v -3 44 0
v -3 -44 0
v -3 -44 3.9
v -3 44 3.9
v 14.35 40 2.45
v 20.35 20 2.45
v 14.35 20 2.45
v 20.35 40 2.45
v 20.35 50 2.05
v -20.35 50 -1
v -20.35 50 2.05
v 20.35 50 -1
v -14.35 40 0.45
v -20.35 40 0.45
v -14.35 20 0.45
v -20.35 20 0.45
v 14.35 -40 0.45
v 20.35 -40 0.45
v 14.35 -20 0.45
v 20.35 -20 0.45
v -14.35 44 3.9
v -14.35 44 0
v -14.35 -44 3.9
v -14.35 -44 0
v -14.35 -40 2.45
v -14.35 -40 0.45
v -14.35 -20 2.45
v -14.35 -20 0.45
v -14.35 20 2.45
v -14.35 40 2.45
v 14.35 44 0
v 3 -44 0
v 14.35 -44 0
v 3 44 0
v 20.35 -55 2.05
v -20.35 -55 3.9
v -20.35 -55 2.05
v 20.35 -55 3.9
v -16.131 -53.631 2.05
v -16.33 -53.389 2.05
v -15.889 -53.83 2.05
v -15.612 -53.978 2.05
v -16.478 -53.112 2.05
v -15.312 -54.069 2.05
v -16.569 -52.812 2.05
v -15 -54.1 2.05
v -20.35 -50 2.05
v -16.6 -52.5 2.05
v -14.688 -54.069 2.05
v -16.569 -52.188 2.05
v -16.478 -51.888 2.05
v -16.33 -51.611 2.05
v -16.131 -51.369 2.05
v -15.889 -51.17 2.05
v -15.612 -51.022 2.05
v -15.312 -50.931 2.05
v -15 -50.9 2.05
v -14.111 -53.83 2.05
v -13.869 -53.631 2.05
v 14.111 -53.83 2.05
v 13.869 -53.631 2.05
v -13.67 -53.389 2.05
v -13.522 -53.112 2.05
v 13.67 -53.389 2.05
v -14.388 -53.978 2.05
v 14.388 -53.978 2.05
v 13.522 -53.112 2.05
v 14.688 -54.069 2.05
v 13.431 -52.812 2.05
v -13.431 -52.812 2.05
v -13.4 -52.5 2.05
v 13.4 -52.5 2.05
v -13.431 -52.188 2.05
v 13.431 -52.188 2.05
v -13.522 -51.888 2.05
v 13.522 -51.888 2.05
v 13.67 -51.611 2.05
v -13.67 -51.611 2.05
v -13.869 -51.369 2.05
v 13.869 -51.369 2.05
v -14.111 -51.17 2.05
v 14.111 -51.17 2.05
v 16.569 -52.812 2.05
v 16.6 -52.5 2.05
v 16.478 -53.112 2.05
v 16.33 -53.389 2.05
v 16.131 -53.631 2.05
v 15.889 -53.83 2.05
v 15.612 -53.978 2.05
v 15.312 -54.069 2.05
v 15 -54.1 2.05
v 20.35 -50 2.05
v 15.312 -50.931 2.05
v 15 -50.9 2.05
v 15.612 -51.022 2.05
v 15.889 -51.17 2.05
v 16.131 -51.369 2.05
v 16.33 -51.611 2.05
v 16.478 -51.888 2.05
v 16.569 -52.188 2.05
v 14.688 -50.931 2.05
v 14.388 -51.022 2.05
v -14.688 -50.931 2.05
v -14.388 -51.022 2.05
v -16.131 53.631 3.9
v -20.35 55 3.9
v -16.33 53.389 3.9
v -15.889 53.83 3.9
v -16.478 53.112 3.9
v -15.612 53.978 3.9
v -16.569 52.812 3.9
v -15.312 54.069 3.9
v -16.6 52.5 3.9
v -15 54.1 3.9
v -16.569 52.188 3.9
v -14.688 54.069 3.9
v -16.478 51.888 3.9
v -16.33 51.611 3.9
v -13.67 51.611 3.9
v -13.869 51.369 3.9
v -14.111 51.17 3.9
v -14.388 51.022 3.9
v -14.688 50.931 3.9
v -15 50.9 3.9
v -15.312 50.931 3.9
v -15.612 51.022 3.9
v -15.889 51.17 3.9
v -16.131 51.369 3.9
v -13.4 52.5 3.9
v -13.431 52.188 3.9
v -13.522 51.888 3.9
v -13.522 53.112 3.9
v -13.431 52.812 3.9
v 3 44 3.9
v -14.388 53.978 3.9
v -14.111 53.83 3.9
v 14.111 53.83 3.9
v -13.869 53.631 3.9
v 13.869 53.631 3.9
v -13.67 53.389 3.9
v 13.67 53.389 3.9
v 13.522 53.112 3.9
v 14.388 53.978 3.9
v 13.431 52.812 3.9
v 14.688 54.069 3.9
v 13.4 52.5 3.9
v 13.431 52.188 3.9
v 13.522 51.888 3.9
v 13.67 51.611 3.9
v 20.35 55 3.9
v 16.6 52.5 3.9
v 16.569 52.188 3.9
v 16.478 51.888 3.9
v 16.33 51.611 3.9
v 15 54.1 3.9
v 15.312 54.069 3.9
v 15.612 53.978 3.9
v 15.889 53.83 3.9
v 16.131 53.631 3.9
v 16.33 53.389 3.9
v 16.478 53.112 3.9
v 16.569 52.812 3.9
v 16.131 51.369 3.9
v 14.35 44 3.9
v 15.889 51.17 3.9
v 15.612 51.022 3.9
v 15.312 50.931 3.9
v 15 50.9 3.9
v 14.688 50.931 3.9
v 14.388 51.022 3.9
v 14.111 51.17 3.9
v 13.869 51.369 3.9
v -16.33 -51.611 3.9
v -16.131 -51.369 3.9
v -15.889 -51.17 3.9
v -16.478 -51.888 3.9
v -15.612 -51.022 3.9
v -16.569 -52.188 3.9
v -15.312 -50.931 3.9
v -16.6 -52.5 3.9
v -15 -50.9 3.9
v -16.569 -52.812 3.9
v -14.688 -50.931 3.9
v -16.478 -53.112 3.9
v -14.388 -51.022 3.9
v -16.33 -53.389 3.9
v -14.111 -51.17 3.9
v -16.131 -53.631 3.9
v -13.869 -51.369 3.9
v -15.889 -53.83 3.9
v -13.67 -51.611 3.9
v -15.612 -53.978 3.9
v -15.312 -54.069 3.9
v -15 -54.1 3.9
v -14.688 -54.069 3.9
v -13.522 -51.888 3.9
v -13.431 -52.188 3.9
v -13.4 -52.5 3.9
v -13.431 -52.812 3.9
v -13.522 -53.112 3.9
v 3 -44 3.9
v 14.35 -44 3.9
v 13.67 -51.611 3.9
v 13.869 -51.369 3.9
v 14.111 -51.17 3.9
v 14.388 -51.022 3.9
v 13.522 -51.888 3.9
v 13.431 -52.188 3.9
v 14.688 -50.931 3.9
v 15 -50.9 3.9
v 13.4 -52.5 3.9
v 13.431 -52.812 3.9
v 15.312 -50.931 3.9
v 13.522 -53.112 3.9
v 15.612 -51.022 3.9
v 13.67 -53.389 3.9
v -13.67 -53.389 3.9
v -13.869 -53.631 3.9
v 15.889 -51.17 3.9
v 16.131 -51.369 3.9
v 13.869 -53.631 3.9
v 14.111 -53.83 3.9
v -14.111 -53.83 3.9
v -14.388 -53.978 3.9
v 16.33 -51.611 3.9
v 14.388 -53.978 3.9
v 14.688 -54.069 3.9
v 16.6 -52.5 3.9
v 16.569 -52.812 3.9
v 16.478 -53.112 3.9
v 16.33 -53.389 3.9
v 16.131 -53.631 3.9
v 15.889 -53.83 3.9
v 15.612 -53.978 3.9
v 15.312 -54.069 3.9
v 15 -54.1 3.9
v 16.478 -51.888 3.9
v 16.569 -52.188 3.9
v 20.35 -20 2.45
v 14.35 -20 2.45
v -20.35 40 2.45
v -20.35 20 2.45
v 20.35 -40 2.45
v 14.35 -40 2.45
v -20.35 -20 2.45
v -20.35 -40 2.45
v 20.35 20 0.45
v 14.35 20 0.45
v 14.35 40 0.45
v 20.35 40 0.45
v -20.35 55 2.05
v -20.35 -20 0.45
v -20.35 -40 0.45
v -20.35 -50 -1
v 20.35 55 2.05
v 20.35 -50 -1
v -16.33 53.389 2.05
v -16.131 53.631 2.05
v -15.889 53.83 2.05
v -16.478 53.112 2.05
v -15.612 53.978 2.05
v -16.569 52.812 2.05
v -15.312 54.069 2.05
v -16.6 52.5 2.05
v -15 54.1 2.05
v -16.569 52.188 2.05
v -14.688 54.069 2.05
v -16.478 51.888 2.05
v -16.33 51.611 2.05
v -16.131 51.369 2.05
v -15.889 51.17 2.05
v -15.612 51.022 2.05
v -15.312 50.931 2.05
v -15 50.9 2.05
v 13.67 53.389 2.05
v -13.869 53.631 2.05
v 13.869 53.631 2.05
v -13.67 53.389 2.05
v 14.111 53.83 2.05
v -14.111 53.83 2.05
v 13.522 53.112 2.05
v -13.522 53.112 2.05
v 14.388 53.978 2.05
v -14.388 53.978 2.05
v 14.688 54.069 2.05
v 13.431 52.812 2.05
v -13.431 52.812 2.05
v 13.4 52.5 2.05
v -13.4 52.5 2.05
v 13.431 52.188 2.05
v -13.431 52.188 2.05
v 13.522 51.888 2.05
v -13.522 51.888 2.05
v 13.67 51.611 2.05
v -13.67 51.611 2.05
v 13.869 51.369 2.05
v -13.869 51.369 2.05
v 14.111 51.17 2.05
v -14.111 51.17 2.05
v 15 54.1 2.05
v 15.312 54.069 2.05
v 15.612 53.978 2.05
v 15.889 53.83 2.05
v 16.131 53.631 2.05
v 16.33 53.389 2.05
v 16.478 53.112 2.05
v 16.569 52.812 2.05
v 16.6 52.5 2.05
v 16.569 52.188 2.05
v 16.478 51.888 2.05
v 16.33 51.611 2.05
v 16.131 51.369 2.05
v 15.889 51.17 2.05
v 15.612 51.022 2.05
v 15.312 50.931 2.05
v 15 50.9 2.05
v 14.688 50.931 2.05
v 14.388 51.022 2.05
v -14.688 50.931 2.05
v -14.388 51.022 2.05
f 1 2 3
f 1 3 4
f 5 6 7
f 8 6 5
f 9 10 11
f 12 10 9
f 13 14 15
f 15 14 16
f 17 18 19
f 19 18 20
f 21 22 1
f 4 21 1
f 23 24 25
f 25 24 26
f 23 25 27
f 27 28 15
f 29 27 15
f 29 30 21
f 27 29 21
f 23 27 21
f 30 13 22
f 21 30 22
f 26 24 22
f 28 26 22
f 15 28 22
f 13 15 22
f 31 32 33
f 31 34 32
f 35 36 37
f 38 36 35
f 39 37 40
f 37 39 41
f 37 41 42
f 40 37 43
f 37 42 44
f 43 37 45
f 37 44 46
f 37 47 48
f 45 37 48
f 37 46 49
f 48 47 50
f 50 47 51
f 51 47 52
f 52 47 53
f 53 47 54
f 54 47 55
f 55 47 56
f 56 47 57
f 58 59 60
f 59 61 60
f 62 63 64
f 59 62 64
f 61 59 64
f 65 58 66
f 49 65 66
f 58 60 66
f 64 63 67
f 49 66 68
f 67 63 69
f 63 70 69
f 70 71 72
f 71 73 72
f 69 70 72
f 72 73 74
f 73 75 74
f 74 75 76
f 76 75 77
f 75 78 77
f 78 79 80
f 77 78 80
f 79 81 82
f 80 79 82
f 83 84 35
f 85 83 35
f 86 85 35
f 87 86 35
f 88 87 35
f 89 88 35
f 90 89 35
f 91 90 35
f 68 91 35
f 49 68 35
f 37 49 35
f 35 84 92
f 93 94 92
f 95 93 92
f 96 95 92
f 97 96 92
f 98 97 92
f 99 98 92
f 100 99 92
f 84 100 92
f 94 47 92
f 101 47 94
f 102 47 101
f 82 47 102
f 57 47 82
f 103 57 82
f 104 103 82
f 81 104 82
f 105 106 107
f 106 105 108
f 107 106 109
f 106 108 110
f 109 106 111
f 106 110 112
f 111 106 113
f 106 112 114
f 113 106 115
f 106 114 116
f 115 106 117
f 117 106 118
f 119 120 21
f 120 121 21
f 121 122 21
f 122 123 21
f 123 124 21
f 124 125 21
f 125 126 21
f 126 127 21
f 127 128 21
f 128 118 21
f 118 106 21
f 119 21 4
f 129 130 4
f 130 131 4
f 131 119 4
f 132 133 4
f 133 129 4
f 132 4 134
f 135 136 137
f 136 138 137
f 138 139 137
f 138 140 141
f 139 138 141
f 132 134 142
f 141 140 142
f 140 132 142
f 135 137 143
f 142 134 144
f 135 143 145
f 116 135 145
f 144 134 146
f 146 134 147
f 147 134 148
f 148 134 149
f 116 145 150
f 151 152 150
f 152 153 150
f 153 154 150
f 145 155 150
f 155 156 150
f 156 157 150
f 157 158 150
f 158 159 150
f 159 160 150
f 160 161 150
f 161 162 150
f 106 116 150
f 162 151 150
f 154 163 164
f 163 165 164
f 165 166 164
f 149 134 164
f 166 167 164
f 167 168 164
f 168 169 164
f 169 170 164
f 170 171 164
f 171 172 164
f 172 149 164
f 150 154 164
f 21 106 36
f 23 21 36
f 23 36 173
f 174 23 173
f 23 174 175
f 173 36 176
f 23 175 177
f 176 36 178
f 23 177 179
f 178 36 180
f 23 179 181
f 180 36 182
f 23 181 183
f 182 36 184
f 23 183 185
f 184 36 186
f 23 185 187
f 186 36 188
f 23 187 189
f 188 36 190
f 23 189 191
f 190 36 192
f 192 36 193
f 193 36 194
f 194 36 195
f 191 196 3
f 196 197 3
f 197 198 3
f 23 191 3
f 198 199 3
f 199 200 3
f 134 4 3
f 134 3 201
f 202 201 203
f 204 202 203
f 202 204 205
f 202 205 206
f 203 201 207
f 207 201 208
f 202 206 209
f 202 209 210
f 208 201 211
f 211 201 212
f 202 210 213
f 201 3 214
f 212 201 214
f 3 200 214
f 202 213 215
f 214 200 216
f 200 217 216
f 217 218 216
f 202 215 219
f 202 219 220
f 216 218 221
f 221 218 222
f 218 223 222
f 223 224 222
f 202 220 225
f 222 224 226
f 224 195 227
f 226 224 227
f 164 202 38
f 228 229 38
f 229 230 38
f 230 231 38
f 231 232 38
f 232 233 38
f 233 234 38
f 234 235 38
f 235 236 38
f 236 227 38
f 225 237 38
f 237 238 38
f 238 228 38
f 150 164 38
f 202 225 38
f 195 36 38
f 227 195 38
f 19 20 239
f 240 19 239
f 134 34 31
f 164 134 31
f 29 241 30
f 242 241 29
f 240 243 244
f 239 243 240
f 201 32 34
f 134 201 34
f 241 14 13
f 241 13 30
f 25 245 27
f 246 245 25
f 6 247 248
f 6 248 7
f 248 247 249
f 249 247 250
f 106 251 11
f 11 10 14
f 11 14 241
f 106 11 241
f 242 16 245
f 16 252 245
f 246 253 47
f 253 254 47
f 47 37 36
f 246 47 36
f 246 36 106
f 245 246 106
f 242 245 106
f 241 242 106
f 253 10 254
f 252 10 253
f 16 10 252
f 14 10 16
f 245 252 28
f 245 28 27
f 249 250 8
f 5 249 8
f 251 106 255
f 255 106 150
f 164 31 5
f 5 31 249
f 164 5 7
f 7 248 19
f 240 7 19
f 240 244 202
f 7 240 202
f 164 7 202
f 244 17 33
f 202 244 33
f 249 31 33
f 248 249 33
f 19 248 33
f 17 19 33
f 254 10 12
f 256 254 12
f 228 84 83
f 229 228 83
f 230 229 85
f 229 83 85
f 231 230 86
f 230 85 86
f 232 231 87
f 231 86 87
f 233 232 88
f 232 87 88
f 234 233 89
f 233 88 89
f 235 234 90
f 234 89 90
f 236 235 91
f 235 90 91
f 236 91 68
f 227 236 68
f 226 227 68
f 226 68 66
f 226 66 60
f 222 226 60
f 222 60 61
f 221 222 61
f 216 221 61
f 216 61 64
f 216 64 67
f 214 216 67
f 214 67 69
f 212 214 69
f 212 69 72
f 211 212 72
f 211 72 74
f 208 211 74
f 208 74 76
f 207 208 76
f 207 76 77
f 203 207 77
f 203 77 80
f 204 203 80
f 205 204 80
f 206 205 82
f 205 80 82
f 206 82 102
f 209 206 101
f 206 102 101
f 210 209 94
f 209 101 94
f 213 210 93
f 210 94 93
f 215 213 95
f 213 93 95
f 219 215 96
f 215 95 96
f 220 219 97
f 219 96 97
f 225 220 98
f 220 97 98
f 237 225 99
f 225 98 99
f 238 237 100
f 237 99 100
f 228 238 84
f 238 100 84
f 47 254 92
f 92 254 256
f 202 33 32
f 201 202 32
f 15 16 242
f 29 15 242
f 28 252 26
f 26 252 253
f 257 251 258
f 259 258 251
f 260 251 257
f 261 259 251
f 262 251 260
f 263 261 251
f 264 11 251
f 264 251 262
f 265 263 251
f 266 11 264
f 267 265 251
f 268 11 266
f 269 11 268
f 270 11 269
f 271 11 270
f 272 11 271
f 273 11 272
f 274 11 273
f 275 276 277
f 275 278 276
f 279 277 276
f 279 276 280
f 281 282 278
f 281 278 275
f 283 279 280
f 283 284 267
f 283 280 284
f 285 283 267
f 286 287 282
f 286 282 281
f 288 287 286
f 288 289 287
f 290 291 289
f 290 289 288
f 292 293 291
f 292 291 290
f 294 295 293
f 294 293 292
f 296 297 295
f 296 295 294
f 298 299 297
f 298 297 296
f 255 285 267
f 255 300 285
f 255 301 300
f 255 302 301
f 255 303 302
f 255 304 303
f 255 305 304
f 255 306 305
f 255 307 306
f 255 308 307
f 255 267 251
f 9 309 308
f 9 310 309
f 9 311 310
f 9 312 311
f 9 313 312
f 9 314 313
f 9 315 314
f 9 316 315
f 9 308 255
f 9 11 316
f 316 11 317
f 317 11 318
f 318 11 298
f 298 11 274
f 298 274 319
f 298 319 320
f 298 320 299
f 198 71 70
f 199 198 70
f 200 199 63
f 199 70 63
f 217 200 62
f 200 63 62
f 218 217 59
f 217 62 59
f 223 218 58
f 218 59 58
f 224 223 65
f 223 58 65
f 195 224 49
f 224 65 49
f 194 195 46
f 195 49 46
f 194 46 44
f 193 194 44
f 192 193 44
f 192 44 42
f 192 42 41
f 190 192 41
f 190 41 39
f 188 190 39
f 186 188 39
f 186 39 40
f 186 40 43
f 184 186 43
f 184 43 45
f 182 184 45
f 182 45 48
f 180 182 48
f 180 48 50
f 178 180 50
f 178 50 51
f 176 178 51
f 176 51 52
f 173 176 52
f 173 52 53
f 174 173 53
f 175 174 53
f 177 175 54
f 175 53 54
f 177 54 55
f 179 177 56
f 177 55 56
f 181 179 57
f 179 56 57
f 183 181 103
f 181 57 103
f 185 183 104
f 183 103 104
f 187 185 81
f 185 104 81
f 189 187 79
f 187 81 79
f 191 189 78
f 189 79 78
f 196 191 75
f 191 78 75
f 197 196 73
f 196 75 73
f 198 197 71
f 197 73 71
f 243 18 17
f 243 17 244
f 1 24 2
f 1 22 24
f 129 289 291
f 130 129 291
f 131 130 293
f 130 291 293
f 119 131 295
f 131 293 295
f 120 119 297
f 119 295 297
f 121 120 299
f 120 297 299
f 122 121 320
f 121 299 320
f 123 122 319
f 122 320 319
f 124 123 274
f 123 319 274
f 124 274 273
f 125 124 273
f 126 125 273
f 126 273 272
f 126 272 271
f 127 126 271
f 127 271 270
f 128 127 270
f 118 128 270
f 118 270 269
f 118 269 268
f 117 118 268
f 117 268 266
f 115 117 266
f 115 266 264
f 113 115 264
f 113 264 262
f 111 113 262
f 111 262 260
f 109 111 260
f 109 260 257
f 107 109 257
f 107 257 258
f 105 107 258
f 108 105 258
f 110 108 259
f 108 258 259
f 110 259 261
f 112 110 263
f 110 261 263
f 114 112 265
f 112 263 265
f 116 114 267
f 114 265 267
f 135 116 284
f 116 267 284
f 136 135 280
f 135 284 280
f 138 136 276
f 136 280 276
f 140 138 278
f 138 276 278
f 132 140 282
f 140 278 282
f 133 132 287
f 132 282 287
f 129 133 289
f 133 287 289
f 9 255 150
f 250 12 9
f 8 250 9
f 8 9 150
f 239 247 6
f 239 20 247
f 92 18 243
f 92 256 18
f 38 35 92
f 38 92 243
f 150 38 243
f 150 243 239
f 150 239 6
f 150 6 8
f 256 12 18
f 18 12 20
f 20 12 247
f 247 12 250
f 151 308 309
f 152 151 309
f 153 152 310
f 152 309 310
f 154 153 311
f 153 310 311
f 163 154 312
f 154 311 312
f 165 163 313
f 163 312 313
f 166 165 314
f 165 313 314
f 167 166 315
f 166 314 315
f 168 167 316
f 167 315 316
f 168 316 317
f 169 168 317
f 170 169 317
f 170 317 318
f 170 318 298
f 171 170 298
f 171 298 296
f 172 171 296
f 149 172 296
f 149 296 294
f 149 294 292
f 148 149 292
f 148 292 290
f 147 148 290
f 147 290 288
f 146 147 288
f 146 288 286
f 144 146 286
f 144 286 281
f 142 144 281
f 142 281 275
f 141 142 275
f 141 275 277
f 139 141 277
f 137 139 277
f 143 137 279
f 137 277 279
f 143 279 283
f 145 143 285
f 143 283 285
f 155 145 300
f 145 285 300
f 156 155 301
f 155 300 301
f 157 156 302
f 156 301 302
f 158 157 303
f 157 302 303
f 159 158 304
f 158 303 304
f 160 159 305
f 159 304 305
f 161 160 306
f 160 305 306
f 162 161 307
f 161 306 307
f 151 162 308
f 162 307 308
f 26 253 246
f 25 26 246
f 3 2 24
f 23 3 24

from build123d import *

# Parameters (mm, degrees)
F0_W      = 40.7
F0_H      = 100
F1_DEPTH  = 1
F2_W      = 40.7
F2_H      = 100
F2_W_2    = 6
F2_H_2    = 88
F3_DEPTH  = 3.9
F4_W      = 40.7
F4_H      = 1.85
F5_DEPTH  = 5
F6_R      = 1.6
F7_DEPTH  = 1.851
F8_W      = 20
F8_H      = 2
F9_DEPTH  = 6
F10_W     = 20
F10_H     = 2
F11_DEPTH = 6


# Not quite as in the source:
# - a pattern or mirror of a feature is missing from the dataset's text; its kind, count and spacing are read off the source's solid


with BuildPart() as f1:
    # F0 (on Top) → F1 (new body)
    with BuildSketch(Plane.XY):
        Rectangle(F0_W, F0_H)
    extrude(amount=-F1_DEPTH)

    # F2 (on Top) → F3 (join)
    with BuildSketch(Plane.XY):
        Rectangle(F2_W, F2_H)
        Polygon((-14.35, -44), (-14.35, 44), (-3, 44), (3, 44), (14.35, 44), (14.35, -44), (3, -44), (-3, -44), align=None, mode=Mode.SUBTRACT)
        Rectangle(F2_W_2, F2_H_2)
    extrude(amount=F3_DEPTH)

    # F4 (on face) → F5 (join)
    with BuildSketch(Plane.XZ.offset(50)):
        with Locations((0, 2.975)):
            Rectangle(F4_W, F4_H)
    f5 = extrude(amount=F5_DEPTH)

    # F5_copies: F5 across plane
    add(f5.mirror(Plane.ZX))

    # F6 (on face) → F7 (cut, through all)
    with BuildSketch(Plane(origin=(0, 0, 2.05), x_dir=(1, 0, 0), z_dir=(0, 0, -1))):
        with Locations((-15, 52.5)):
            Circle(F6_R)
        with Locations((15, 52.5)):
            Circle(F6_R)
        with Locations((-15, -52.5)):
            Circle(F6_R)
        with Locations((15, -52.5)):
            Circle(F6_R)
    extrude(amount=-F7_DEPTH, mode=Mode.SUBTRACT)

    # F8 (on face) → F9 (cut, through all)
    with BuildSketch(Plane(origin=(-20.35, 0, 0), x_dir=(0, -1, 0), z_dir=(-1, 0, 0))):
        with Locations((-30, 1.45)):
            Rectangle(F8_W, F8_H)
        with Locations((30, 1.45)):
            Rectangle(F8_W, F8_H)
    extrude(amount=-F9_DEPTH, mode=Mode.SUBTRACT)

    # F10 (on face) → F11 (cut, through all)
    with BuildSketch(Plane.YZ.offset(20.35)):
        with Locations((-30, 1.45)):
            Rectangle(F10_W, F10_H)
        with Locations((30, 1.45)):
            Rectangle(F10_W, F10_H)
    extrude(amount=-F11_DEPTH, mode=Mode.SUBTRACT)


solid = f1.part
